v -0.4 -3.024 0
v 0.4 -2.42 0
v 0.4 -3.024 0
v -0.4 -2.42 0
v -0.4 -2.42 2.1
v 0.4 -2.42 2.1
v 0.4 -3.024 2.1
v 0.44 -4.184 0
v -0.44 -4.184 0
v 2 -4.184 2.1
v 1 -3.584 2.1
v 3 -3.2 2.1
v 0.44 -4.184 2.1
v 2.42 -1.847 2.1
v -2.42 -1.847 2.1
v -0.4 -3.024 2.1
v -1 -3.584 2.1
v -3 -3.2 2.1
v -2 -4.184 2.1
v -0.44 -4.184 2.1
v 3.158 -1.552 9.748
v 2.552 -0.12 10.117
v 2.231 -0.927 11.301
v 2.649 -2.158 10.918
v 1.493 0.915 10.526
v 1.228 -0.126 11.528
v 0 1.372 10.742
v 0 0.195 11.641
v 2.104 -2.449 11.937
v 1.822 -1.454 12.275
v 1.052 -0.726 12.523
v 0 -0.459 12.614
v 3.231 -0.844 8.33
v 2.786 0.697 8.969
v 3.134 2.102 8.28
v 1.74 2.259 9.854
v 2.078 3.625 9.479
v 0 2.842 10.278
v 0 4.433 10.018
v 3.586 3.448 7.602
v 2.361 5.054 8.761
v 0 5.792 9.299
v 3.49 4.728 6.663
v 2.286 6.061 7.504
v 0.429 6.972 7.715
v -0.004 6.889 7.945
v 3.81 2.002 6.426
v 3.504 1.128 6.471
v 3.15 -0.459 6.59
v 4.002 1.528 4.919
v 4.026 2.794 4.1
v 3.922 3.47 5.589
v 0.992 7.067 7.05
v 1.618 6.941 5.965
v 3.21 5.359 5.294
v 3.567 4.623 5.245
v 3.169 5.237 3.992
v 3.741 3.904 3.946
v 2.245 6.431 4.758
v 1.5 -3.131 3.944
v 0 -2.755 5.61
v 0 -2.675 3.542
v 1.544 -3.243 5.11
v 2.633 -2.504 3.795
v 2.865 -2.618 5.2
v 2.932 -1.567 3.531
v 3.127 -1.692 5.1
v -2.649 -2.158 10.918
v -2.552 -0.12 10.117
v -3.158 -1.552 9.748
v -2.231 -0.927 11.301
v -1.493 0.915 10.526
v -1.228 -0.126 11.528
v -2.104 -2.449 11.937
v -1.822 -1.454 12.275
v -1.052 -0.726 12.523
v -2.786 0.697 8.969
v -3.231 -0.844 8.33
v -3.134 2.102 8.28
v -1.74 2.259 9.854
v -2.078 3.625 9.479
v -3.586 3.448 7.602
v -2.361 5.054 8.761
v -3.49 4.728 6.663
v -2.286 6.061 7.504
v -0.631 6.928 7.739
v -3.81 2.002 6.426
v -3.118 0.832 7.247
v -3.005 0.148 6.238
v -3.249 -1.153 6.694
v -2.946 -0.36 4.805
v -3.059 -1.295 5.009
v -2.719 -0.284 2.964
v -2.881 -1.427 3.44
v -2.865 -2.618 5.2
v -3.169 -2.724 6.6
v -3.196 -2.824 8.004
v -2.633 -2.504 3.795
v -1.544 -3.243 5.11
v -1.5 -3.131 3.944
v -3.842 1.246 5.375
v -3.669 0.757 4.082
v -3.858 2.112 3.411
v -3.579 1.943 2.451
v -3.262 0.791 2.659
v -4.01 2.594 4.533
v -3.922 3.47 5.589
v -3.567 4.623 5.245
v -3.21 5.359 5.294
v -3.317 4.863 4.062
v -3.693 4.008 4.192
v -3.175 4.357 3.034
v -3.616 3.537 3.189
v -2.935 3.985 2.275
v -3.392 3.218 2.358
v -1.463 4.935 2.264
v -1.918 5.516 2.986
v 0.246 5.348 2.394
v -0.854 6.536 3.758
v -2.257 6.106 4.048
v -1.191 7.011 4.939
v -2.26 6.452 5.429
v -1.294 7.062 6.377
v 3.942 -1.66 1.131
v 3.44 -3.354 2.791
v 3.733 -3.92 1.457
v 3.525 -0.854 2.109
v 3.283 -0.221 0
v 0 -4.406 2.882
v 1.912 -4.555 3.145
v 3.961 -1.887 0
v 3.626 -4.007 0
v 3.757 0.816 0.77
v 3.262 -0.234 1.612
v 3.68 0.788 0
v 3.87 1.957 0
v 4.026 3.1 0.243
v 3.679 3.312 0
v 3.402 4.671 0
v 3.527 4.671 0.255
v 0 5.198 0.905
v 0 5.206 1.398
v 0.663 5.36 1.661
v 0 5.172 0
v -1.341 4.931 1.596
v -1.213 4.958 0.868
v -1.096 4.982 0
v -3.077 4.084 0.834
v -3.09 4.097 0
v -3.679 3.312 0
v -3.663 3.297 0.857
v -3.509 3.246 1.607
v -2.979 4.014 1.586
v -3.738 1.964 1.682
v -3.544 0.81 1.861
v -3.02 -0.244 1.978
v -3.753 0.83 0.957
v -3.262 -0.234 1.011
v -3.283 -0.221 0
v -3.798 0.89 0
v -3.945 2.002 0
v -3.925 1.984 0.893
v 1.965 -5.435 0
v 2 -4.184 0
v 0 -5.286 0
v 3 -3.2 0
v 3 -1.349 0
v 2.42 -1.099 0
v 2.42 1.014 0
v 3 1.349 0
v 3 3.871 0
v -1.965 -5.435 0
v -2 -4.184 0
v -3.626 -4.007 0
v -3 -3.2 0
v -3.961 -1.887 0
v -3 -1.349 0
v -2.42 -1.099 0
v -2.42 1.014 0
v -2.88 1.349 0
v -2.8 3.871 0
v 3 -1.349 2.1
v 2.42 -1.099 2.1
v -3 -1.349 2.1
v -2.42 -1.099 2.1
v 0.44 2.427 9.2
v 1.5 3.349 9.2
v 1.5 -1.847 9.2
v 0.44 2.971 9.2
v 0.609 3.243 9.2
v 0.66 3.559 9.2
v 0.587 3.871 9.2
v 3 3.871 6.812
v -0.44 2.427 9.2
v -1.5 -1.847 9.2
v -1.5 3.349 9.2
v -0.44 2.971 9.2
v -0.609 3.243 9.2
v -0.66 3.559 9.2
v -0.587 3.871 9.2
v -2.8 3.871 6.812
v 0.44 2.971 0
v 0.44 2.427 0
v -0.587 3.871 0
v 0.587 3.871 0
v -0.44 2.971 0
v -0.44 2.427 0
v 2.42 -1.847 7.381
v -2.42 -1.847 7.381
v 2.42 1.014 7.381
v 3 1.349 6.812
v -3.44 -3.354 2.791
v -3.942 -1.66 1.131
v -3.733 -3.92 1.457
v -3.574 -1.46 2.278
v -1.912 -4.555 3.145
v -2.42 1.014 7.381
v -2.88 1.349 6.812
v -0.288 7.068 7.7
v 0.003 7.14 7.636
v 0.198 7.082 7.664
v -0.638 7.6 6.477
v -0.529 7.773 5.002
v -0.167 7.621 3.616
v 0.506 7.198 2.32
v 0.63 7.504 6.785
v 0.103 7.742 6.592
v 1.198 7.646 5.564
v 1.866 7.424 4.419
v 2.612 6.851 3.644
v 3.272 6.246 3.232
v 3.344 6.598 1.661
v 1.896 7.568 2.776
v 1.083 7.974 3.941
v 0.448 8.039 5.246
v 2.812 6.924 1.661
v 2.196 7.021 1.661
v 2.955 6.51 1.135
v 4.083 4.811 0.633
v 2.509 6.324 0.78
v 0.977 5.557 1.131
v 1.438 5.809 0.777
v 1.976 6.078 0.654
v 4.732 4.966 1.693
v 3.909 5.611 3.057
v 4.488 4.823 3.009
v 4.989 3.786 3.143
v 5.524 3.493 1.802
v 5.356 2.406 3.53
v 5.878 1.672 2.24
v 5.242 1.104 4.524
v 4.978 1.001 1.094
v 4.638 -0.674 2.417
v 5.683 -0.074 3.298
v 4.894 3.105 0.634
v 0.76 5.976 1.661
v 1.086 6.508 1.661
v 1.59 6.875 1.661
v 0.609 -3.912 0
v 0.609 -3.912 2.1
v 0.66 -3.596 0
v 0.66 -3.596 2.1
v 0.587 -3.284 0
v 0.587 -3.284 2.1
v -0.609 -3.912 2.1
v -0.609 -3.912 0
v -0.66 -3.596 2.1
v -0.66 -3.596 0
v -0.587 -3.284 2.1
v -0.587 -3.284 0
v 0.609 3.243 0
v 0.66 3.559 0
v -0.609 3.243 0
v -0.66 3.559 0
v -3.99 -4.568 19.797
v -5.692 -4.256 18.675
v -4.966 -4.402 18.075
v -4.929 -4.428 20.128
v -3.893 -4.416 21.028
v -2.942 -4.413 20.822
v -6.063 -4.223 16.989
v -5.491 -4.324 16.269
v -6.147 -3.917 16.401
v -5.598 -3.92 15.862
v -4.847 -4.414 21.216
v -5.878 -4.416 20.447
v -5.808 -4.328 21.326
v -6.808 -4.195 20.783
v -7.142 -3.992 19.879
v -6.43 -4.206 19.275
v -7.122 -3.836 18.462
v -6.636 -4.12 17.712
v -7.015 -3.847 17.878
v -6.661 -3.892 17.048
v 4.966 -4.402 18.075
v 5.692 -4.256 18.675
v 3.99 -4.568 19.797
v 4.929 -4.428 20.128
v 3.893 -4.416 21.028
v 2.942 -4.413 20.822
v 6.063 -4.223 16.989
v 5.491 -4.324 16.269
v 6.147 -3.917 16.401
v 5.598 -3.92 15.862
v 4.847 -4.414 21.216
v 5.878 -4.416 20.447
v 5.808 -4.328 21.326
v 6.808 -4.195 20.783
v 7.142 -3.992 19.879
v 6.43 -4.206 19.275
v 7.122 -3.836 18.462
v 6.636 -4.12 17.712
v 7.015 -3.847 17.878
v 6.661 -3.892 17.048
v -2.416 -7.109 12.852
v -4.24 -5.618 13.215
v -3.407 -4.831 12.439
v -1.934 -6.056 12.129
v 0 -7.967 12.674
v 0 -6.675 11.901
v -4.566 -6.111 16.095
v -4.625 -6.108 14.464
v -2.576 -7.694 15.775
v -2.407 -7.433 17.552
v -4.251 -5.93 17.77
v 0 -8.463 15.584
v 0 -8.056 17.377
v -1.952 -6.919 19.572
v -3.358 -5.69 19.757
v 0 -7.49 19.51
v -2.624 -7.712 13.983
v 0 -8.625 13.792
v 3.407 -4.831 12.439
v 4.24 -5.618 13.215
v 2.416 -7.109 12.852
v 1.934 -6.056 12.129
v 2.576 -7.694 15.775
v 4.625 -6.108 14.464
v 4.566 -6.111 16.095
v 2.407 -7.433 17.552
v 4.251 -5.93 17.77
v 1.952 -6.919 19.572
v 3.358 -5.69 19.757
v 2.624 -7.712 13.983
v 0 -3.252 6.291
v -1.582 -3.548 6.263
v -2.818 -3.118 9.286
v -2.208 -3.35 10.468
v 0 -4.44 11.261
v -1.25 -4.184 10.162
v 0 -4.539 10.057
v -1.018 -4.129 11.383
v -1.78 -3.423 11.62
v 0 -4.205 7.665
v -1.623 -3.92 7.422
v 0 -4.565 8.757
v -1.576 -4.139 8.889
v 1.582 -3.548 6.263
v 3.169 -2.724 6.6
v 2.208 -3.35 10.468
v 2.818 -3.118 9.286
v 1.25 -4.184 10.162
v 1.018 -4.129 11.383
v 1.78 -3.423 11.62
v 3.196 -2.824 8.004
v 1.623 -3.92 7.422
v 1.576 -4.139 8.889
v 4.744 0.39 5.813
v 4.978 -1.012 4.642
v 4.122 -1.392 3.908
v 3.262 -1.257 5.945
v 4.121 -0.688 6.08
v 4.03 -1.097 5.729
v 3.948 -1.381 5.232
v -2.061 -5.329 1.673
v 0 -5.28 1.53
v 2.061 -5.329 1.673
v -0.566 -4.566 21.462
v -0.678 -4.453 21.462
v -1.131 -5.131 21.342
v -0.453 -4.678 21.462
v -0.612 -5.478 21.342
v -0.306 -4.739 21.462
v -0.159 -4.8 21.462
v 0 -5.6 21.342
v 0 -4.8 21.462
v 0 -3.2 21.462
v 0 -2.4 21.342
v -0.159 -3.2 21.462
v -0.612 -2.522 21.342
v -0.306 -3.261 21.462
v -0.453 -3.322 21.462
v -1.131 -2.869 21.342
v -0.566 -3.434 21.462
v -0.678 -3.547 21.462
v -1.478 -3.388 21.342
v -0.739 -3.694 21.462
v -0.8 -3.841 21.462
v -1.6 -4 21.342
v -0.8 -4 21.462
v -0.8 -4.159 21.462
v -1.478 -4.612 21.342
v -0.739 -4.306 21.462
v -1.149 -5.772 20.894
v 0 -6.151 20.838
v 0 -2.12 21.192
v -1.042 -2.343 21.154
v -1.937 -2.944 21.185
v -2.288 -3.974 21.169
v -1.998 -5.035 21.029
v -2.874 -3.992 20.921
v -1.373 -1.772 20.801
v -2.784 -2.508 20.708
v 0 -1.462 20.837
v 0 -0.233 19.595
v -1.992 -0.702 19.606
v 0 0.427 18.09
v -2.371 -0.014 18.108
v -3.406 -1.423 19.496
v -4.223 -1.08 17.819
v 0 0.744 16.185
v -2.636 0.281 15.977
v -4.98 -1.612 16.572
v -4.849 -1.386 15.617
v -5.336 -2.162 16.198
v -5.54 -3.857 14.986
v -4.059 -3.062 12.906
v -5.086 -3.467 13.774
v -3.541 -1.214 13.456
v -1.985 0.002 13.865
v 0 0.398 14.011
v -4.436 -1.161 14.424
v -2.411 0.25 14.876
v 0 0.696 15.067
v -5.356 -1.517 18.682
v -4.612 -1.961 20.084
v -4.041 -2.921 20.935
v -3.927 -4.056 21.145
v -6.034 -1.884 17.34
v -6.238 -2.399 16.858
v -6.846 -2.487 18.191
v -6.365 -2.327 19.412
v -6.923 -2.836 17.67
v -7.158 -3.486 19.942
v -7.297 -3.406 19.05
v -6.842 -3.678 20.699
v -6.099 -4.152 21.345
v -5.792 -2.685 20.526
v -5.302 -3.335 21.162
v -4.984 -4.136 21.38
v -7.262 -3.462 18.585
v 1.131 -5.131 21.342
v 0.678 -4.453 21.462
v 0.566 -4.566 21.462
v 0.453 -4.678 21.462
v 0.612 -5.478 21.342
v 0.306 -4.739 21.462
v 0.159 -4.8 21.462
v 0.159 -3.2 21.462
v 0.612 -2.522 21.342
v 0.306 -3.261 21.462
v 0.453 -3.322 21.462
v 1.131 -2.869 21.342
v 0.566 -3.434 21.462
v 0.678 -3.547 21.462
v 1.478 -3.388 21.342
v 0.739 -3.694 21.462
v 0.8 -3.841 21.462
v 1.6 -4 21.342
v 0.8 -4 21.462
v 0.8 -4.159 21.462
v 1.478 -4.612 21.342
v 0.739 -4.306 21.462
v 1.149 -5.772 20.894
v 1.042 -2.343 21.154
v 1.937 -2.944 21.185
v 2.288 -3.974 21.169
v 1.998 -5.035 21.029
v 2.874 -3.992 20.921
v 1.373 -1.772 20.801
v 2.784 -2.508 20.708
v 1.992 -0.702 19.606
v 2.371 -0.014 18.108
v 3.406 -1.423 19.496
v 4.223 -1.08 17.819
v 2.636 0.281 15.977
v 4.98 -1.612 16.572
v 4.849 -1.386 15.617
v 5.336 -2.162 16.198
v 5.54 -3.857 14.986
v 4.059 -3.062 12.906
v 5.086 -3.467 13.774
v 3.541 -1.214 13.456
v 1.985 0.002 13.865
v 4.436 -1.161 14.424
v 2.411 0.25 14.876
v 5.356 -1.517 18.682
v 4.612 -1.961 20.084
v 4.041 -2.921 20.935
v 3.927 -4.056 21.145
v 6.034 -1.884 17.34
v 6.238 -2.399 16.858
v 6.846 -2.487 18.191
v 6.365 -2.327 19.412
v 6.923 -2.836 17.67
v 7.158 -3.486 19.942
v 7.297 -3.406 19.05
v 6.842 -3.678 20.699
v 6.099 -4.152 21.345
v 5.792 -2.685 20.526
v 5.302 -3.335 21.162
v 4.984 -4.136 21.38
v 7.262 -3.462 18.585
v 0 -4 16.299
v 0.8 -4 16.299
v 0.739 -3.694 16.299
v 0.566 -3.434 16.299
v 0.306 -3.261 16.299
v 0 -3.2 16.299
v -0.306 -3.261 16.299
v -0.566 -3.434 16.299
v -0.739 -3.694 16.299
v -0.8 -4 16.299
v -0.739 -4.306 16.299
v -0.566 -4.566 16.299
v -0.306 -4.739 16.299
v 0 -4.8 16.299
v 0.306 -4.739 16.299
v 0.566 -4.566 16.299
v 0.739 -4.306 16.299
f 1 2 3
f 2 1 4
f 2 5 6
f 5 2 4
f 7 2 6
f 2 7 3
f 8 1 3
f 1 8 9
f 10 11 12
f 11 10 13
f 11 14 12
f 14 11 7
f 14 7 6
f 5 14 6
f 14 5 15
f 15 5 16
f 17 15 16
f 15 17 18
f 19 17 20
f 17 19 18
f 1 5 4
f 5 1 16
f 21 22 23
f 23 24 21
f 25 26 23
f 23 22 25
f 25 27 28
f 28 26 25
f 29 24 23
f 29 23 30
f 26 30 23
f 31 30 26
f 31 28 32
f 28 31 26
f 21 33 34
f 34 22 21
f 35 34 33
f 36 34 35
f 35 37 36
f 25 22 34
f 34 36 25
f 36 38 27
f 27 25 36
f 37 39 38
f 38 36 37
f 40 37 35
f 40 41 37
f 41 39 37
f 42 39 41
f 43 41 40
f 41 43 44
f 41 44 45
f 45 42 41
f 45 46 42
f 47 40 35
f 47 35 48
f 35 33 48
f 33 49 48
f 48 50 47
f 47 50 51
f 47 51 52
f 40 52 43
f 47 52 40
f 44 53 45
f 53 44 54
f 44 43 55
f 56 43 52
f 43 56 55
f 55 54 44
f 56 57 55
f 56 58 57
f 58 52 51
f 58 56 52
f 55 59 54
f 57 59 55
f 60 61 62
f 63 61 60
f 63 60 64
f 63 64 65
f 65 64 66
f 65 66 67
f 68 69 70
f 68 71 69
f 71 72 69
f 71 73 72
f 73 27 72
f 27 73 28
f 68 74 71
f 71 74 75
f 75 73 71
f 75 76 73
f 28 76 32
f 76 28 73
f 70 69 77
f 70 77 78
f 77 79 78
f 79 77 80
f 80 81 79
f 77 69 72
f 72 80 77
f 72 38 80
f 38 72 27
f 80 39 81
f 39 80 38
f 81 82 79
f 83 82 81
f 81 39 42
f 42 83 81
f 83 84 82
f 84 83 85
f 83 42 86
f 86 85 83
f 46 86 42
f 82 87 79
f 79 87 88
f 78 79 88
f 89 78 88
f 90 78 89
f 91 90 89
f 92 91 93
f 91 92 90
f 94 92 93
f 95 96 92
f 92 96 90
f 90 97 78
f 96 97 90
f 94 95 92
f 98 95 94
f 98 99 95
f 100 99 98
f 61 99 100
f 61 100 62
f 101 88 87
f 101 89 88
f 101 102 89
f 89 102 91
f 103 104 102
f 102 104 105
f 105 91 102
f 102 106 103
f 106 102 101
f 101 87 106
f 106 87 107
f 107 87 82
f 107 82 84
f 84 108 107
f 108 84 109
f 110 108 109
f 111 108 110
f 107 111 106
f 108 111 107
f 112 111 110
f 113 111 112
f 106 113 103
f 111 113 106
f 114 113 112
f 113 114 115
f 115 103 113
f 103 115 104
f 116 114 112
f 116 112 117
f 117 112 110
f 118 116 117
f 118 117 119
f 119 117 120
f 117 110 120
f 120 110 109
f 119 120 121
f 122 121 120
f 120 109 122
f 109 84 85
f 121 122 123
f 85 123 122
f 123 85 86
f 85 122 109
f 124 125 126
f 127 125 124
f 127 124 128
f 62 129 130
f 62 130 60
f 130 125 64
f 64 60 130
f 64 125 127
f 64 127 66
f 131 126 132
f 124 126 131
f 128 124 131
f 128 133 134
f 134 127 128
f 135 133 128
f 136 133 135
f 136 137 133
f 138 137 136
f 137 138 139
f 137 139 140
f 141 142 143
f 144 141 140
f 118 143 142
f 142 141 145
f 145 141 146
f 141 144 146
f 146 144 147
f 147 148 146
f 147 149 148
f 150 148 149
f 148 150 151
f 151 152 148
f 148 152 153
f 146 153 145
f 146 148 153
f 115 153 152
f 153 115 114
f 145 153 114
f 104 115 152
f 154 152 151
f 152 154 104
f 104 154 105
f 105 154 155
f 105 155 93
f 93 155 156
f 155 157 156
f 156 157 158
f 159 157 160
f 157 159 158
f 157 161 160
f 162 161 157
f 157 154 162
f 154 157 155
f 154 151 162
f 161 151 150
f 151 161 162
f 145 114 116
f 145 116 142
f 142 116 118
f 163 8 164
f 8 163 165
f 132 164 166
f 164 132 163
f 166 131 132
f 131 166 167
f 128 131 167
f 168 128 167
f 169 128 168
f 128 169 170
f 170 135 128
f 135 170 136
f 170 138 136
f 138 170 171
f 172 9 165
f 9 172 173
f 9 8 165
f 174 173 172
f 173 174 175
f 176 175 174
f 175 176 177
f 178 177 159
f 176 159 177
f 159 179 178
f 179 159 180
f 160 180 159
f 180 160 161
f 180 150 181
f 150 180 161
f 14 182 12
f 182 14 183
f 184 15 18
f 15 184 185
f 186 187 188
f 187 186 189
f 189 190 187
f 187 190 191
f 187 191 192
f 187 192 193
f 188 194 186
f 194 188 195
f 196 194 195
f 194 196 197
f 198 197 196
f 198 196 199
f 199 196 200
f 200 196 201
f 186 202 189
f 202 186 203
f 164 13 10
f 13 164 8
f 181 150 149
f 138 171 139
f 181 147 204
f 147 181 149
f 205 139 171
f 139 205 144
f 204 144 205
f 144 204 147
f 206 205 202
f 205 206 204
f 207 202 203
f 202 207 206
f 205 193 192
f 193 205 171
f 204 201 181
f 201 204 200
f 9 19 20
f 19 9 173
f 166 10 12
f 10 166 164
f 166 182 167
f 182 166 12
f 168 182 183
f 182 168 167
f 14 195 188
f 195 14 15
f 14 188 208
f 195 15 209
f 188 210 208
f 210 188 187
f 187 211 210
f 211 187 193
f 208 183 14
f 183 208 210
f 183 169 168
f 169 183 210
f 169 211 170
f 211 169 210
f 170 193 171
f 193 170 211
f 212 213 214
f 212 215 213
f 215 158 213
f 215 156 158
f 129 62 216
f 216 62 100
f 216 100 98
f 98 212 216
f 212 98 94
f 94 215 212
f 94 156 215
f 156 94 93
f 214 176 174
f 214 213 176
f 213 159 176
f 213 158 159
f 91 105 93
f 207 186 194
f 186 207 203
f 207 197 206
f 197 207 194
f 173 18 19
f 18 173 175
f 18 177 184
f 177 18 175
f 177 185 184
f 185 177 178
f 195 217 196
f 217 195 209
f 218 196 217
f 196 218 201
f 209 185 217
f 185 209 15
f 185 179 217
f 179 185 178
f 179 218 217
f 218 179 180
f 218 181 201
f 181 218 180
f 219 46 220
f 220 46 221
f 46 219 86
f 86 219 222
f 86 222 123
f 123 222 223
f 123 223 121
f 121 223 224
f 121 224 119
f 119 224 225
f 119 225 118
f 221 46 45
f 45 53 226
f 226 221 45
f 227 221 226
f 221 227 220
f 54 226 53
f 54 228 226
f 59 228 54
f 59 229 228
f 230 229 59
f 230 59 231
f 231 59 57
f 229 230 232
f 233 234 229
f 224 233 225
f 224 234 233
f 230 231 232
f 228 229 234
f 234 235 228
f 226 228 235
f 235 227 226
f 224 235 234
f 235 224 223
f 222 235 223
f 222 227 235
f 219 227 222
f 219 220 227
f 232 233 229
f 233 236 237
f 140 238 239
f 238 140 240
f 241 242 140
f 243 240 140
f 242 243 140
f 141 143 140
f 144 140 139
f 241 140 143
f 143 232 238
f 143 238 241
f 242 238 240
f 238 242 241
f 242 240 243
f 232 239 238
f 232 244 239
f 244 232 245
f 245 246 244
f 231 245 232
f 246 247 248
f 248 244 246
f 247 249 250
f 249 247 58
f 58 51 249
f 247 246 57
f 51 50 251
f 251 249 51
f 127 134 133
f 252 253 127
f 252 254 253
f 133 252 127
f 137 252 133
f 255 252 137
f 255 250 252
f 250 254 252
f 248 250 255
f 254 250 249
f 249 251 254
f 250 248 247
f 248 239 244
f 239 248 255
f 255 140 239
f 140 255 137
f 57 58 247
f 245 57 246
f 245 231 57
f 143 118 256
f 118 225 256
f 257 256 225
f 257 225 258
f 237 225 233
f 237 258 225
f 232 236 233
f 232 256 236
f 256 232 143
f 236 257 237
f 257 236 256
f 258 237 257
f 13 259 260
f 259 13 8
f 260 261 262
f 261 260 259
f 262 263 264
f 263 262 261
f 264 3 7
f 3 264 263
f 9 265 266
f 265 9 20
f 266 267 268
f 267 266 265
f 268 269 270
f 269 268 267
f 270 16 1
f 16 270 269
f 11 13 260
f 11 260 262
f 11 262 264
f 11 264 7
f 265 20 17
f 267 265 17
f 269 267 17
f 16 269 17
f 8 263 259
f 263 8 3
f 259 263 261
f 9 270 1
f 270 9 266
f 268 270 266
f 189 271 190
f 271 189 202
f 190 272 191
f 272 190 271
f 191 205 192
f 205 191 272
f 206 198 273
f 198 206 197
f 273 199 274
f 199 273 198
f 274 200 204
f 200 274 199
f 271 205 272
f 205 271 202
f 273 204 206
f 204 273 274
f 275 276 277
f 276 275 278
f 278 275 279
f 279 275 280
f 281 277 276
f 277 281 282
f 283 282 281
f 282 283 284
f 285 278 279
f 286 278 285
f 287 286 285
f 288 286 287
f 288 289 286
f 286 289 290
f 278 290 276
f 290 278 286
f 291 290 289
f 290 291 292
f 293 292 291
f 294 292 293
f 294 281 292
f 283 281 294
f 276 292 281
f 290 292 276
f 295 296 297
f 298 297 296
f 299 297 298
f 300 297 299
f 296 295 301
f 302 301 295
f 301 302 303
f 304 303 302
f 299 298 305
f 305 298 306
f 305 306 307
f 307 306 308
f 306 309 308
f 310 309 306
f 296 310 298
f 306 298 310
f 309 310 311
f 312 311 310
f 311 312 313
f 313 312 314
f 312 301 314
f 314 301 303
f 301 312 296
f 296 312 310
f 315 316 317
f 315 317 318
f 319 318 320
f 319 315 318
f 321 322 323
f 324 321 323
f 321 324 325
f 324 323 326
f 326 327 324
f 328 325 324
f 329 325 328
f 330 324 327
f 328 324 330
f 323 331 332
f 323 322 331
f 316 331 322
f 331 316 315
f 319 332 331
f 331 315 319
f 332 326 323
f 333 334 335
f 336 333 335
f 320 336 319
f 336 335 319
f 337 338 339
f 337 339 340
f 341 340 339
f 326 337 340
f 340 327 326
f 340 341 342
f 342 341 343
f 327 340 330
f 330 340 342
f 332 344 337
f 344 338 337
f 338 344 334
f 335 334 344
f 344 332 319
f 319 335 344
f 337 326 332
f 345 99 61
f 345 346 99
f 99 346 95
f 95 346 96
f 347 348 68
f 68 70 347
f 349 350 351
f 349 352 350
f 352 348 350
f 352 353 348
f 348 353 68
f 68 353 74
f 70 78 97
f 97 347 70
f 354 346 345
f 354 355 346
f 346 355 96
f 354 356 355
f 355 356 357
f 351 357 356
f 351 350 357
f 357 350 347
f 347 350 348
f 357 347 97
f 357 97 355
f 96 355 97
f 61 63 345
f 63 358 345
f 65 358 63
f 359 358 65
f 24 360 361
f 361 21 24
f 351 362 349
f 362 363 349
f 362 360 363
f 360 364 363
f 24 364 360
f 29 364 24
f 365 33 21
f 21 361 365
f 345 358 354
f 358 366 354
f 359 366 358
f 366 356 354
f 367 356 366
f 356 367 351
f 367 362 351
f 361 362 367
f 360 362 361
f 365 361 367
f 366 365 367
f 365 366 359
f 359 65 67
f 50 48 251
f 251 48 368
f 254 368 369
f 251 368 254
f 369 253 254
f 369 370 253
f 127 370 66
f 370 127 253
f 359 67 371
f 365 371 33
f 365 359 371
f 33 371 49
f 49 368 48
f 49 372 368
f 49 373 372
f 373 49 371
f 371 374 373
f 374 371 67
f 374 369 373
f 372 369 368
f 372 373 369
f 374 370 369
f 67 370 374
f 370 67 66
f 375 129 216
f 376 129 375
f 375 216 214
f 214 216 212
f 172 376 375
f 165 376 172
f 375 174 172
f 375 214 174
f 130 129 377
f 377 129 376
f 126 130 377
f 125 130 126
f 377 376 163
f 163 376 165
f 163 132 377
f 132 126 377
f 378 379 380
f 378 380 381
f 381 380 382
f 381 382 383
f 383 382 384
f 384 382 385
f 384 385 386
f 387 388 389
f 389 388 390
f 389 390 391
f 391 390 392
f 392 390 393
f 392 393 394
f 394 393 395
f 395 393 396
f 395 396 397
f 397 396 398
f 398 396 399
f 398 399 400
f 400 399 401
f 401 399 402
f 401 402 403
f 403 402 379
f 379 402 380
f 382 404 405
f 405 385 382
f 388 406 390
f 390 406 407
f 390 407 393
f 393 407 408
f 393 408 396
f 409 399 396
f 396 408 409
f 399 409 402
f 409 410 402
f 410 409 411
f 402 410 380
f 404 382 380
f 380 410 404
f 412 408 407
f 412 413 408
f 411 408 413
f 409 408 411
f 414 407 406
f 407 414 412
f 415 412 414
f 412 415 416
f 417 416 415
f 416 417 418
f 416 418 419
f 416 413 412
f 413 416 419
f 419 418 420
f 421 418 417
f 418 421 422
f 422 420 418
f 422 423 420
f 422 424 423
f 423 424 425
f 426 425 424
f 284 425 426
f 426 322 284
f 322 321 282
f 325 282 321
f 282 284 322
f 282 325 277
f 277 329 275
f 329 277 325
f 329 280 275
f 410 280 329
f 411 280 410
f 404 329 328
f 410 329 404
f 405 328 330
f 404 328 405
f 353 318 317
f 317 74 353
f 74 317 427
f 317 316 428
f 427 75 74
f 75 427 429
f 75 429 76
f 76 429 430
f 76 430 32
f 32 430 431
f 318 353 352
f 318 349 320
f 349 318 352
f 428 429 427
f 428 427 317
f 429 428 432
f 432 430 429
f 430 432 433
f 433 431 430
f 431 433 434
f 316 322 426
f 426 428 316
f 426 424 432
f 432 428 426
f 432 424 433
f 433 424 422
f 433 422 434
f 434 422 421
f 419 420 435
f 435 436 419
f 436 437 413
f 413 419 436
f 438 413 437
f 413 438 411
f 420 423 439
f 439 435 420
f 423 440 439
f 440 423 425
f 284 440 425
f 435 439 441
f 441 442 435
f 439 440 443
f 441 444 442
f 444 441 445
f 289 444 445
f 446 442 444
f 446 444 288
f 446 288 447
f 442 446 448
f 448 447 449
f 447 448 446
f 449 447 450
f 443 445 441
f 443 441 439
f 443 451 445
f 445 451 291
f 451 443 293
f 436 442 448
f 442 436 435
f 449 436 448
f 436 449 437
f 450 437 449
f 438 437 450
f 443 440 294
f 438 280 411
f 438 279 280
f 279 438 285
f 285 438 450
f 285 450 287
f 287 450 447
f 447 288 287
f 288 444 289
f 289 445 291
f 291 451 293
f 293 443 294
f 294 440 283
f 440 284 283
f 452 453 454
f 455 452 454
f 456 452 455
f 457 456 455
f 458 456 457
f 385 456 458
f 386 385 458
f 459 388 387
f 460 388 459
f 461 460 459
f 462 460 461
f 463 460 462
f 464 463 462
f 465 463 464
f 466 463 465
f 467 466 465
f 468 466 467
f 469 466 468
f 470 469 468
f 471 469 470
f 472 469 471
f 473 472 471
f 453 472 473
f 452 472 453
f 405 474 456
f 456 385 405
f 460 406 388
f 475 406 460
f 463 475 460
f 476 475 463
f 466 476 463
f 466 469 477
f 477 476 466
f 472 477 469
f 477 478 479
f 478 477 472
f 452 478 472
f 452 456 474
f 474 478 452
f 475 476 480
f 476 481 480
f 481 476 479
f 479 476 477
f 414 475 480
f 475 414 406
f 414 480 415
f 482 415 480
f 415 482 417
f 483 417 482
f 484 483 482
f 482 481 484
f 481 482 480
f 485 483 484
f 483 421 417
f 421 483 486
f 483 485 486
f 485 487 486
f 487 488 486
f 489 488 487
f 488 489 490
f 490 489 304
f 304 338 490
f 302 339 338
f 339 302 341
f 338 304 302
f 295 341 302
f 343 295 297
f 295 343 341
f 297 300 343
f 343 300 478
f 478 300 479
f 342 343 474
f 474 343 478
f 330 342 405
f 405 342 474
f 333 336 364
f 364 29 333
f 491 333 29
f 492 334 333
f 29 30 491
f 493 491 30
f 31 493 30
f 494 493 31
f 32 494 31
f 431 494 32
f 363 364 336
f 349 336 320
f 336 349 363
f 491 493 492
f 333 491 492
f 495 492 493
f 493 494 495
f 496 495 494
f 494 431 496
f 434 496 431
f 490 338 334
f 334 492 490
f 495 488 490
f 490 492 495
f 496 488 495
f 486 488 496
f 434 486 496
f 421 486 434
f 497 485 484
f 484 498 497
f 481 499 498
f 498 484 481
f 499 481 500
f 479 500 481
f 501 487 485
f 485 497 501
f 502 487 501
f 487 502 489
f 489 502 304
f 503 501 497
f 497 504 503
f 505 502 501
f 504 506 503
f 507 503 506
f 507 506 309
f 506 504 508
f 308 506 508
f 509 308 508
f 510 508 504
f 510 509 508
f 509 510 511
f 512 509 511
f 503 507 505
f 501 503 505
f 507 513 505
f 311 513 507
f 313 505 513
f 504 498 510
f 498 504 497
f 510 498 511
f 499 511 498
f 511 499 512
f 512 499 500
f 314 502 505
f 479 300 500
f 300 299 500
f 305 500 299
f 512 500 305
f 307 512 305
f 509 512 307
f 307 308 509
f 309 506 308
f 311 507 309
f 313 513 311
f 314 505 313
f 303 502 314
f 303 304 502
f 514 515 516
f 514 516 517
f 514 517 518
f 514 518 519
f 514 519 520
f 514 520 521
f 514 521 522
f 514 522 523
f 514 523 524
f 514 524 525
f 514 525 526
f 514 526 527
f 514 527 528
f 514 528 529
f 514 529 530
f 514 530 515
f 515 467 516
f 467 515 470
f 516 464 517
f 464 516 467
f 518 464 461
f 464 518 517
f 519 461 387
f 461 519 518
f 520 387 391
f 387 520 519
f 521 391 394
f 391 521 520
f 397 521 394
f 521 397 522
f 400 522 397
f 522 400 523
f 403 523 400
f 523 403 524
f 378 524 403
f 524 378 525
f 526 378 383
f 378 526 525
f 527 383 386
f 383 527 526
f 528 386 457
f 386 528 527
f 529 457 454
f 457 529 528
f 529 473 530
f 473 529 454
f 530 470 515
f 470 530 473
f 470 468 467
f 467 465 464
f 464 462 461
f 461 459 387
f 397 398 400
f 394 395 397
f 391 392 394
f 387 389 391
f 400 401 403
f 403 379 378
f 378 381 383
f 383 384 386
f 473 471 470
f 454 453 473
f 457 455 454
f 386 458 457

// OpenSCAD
use <../lib.scad>
use <../p/1-4tang.scad>
use <../p/4-4cylc.scad>
use <s/11602s01.scad>
use <s/11602s02.scad>
use <s/11602s03.scad>
use <s/11602s04.scad>
use <s/11602s05.scad>
use <s/11602s06.scad>
use <s/11602s07.scad>
function ldraw_lib__11602() = [
// 0 Animal Cat Sitting
// 0 Name: 11602.dat
// 0 Author: Javier Orquera [kuramapika1]
// 0 !LDRAW_ORG Part UPDATE 2025-08
// 0 !LICENSE Licensed under CC BY 4.0 : see CAreadme.txt
// 
// 0 BFC CERTIFY CCW
  [0,"BFC","CERTIFY"],
  [0,"BFC","CCW"],
// 
// 0 !KEYWORDS animal, Cat, Set 2000430-2
// 
// 0 !HISTORY 2023-05-13 {LEGO Instructions App} Original part shape
// 0 !HISTORY 2023-07-13 [kuramapika1] File preparation for LDraw Parts Tracker
// 0 !HISTORY 2025-08-31 [OrionP] Official Update 2025-08
// 
// 1 16 0 0 0 1 0 0 0 1 0 0 0 1 s\11602s01.dat
  [1,16,0,0,0,1,0,0,0,1,0,0,0,1, ldraw_lib__s__11602s01()],
// 1 16 0 0 0 1 0 0 0 1 0 0 0 1 s\11602s02.dat
  [1,16,0,0,0,1,0,0,0,1,0,0,0,1, ldraw_lib__s__11602s02()],
// 1 16 0 0 0 -1 0 0 0 1 0 0 0 1 s\11602s02.dat
  [1,16,0,0,0,-1,0,0,0,1,0,0,0,1, ldraw_lib__s__11602s02()],
// 1 16 0 0 0 1 0 0 0 1 0 0 0 1 s\11602s03.dat
  [1,16,0,0,0,1,0,0,0,1,0,0,0,1, ldraw_lib__s__11602s03()],
// 1 16 0 0 0 -1 0 0 0 1 0 0 0 1 s\11602s03.dat
  [1,16,0,0,0,-1,0,0,0,1,0,0,0,1, ldraw_lib__s__11602s03()],
// 1 16 0 0 0 1 0 0 0 1 0 0 0 1 s\11602s04.dat
  [1,16,0,0,0,1,0,0,0,1,0,0,0,1, ldraw_lib__s__11602s04()],
// 1 16 0 0 0 -1 0 0 0 1 0 0 0 1 s\11602s04.dat
  [1,16,0,0,0,-1,0,0,0,1,0,0,0,1, ldraw_lib__s__11602s04()],
// 1 16 0 0 0 1 0 0 0 1 0 0 0 1 s\11602s05.dat
  [1,16,0,0,0,1,0,0,0,1,0,0,0,1, ldraw_lib__s__11602s05()],
// 1 16 0 0 0 1 0 0 0 1 0 0 0 1 s\11602s06.dat
  [1,16,0,0,0,1,0,0,0,1,0,0,0,1, ldraw_lib__s__11602s06()],
// 1 16 0 0 0 -1 0 0 0 1 0 0 0 1 s\11602s06.dat
  [1,16,0,0,0,-1,0,0,0,1,0,0,0,1, ldraw_lib__s__11602s06()],
// 1 16 0 0 0 1 0 0 0 1 0 0 0 1 s\11602s07.dat
  [1,16,0,0,0,1,0,0,0,1,0,0,0,1, ldraw_lib__s__11602s07()],
// 1 16 0 0 0 -1 0 0 0 1 0 0 0 1 s\11602s07.dat
  [1,16,0,0,0,-1,0,0,0,1,0,0,0,1, ldraw_lib__s__11602s07()],
// 0 BFC INVERTNEXT
  [0,"BFC","INVERTNEXT"],
// 1 16 0 -40.747 -10 2 0 0 0 -12.909 0 0 0 2 4-4cylc.dat
  [1,16,0,-40.747,-10,2,0,0,0,-12.909,0,0,0,2, ldraw_lib__4_4cylc()],
// 1 16 0 -53.656 -10 2 0 0 0 1 0 0 0 2 1-4tang.dat
  [1,16,0,-53.656,-10,2,0,0,0,1,0,0,0,2, ldraw_lib__1_4tang()],
// 1 16 0 -53.656 -10 -2 0 0 0 1 0 0 0 2 1-4tang.dat
  [1,16,0,-53.656,-10,-2,0,0,0,1,0,0,0,2, ldraw_lib__1_4tang()],
// 1 16 0 -53.656 -10 -2 0 0 0 1 0 0 0 -2 1-4tang.dat
  [1,16,0,-53.656,-10,-2,0,0,0,1,0,0,0,-2, ldraw_lib__1_4tang()],
// 1 16 0 -53.656 -10 2 0 0 0 1 0 0 0 -2 1-4tang.dat
  [1,16,0,-53.656,-10,2,0,0,0,1,0,0,0,-2, ldraw_lib__1_4tang()],
// 5 24 0 -31.686 -19.918 0 -34.479 -21.562 -6.041 -32.13 -17.772 6.041 -32.13 -17.772
  [5,24,0,-31.686,-19.918,0,-34.479,-21.562,-6.041,-32.13,-17.772,6.041,-32.13,-17.772],
// 5 24 0 -14.026 -6.887 0 -15.727 -8.13 -3.86 -12.776 -8.107 3.86 -12.776 -8.107
  [5,24,0,-14.026,-6.887,0,-15.727,-8.13,-3.86,-12.776,-8.107,3.86,-12.776,-8.107],
// 5 24 0 -21.893 -11.413 0 -25.143 -11.348 -3.939 -22.223 -10.347 3.939 -22.223 -10.347
  [5,24,0,-21.893,-11.413,0,-25.143,-11.348,-3.939,-22.223,-10.347,3.939,-22.223,-10.347],
// 5 24 0 -7.206 -11.015 4.779 -7.862 -11.387 0 -8.854 -6.688 5.153 -4.182 -13.322
  [5,24,0,-7.206,-11.015,4.779,-7.862,-11.387,0,-8.854,-6.688,5.153,-4.182,-13.322],
// 5 24 9.332 -3.642 -9.801 9.064 0 -10.017 9.903 0 -4.717 5.153 -4.182 -13.322
  [5,24,9.332,-3.642,-9.801,9.064,0,-10.017,9.903,0,-4.717,5.153,-4.182,-13.322],
// 5 24 0 -15.727 -8.13 0 -19.163 -10.513 3.955 -15.657 -8.87 -3.955 -15.657 -8.87
  [5,24,0,-15.727,-8.13,0,-19.163,-10.513,3.955,-15.657,-8.87,-3.955,-15.657,-8.87],
// 5 24 -4.779 -7.862 -11.387 0 -7.206 -11.015 -5.153 -4.182 -13.322 0 -8.854 -6.688
  [5,24,-4.779,-7.862,-11.387,0,-7.206,-11.015,-5.153,-4.182,-13.322,0,-8.854,-6.688],
// 5 24 0 -34.479 -21.562 0 -38.96 -21.157 -6.56 -34.958 -19.281 6.56 -34.958 -19.281
  [5,24,0,-34.479,-21.562,0,-38.96,-21.157,-6.56,-34.958,-19.281,6.56,-34.958,-19.281],
// 5 24 0 -25.143 -11.348 0 -28.152 -11.099 -3.125 -25.405 -10.46 3.125 -25.405 -10.46
  [5,24,0,-25.143,-11.348,0,-28.152,-11.099,-3.125,-25.405,-10.46,3.125,-25.405,-10.46],
// 5 24 -9.064 0 -10.017 -9.332 -3.642 -9.801 -9.903 0 -4.717 -5.153 -4.182 -13.322
  [5,24,-9.064,0,-10.017,-9.332,-3.642,-9.801,-9.903,0,-4.717,-5.153,-4.182,-13.322],
// 5 24 0 -19.163 -10.513 0 -21.893 -11.413 -4.057 -18.556 -9.8 4.057 -18.556 -9.8
  [5,24,0,-19.163,-10.513,0,-21.893,-11.413,-4.057,-18.556,-9.8,4.057,-18.556,-9.8],
// 5 24 0 -43.442 -20.141 0 -48.776 -18.725 -6.017 -43.879 -18.583 6.017 -43.879 -18.583
  [5,24,0,-43.442,-20.141,0,-48.776,-18.725,-6.017,-43.879,-18.583,6.017,-43.879,-18.583],
// 5 24 0 -29.752 -16.687 0 -31.686 -19.918 -4.834 -30.323 -15.139 4.834 -30.323 -15.139
  [5,24,0,-29.752,-16.687,0,-31.686,-19.918,-4.834,-30.323,-15.139,4.834,-30.323,-15.139],
// 5 24 0 -38.96 -21.157 0 -43.442 -20.141 6.441 -39.438 -19.234 -6.441 -39.438 -19.234
  [5,24,0,-38.96,-21.157,0,-43.442,-20.141,6.441,-39.438,-19.234,-6.441,-39.438,-19.234],
];
module ldraw_lib__11602(step=0, col=false, unit=2/5, alt=false, line=0.2, solid=!$preview)
    makepoly(ldraw_lib__11602(), step=step, col=col, unit=unit, alt=alt, line=line, solid=solid);
ldraw_lib__11602(line=0.2);
